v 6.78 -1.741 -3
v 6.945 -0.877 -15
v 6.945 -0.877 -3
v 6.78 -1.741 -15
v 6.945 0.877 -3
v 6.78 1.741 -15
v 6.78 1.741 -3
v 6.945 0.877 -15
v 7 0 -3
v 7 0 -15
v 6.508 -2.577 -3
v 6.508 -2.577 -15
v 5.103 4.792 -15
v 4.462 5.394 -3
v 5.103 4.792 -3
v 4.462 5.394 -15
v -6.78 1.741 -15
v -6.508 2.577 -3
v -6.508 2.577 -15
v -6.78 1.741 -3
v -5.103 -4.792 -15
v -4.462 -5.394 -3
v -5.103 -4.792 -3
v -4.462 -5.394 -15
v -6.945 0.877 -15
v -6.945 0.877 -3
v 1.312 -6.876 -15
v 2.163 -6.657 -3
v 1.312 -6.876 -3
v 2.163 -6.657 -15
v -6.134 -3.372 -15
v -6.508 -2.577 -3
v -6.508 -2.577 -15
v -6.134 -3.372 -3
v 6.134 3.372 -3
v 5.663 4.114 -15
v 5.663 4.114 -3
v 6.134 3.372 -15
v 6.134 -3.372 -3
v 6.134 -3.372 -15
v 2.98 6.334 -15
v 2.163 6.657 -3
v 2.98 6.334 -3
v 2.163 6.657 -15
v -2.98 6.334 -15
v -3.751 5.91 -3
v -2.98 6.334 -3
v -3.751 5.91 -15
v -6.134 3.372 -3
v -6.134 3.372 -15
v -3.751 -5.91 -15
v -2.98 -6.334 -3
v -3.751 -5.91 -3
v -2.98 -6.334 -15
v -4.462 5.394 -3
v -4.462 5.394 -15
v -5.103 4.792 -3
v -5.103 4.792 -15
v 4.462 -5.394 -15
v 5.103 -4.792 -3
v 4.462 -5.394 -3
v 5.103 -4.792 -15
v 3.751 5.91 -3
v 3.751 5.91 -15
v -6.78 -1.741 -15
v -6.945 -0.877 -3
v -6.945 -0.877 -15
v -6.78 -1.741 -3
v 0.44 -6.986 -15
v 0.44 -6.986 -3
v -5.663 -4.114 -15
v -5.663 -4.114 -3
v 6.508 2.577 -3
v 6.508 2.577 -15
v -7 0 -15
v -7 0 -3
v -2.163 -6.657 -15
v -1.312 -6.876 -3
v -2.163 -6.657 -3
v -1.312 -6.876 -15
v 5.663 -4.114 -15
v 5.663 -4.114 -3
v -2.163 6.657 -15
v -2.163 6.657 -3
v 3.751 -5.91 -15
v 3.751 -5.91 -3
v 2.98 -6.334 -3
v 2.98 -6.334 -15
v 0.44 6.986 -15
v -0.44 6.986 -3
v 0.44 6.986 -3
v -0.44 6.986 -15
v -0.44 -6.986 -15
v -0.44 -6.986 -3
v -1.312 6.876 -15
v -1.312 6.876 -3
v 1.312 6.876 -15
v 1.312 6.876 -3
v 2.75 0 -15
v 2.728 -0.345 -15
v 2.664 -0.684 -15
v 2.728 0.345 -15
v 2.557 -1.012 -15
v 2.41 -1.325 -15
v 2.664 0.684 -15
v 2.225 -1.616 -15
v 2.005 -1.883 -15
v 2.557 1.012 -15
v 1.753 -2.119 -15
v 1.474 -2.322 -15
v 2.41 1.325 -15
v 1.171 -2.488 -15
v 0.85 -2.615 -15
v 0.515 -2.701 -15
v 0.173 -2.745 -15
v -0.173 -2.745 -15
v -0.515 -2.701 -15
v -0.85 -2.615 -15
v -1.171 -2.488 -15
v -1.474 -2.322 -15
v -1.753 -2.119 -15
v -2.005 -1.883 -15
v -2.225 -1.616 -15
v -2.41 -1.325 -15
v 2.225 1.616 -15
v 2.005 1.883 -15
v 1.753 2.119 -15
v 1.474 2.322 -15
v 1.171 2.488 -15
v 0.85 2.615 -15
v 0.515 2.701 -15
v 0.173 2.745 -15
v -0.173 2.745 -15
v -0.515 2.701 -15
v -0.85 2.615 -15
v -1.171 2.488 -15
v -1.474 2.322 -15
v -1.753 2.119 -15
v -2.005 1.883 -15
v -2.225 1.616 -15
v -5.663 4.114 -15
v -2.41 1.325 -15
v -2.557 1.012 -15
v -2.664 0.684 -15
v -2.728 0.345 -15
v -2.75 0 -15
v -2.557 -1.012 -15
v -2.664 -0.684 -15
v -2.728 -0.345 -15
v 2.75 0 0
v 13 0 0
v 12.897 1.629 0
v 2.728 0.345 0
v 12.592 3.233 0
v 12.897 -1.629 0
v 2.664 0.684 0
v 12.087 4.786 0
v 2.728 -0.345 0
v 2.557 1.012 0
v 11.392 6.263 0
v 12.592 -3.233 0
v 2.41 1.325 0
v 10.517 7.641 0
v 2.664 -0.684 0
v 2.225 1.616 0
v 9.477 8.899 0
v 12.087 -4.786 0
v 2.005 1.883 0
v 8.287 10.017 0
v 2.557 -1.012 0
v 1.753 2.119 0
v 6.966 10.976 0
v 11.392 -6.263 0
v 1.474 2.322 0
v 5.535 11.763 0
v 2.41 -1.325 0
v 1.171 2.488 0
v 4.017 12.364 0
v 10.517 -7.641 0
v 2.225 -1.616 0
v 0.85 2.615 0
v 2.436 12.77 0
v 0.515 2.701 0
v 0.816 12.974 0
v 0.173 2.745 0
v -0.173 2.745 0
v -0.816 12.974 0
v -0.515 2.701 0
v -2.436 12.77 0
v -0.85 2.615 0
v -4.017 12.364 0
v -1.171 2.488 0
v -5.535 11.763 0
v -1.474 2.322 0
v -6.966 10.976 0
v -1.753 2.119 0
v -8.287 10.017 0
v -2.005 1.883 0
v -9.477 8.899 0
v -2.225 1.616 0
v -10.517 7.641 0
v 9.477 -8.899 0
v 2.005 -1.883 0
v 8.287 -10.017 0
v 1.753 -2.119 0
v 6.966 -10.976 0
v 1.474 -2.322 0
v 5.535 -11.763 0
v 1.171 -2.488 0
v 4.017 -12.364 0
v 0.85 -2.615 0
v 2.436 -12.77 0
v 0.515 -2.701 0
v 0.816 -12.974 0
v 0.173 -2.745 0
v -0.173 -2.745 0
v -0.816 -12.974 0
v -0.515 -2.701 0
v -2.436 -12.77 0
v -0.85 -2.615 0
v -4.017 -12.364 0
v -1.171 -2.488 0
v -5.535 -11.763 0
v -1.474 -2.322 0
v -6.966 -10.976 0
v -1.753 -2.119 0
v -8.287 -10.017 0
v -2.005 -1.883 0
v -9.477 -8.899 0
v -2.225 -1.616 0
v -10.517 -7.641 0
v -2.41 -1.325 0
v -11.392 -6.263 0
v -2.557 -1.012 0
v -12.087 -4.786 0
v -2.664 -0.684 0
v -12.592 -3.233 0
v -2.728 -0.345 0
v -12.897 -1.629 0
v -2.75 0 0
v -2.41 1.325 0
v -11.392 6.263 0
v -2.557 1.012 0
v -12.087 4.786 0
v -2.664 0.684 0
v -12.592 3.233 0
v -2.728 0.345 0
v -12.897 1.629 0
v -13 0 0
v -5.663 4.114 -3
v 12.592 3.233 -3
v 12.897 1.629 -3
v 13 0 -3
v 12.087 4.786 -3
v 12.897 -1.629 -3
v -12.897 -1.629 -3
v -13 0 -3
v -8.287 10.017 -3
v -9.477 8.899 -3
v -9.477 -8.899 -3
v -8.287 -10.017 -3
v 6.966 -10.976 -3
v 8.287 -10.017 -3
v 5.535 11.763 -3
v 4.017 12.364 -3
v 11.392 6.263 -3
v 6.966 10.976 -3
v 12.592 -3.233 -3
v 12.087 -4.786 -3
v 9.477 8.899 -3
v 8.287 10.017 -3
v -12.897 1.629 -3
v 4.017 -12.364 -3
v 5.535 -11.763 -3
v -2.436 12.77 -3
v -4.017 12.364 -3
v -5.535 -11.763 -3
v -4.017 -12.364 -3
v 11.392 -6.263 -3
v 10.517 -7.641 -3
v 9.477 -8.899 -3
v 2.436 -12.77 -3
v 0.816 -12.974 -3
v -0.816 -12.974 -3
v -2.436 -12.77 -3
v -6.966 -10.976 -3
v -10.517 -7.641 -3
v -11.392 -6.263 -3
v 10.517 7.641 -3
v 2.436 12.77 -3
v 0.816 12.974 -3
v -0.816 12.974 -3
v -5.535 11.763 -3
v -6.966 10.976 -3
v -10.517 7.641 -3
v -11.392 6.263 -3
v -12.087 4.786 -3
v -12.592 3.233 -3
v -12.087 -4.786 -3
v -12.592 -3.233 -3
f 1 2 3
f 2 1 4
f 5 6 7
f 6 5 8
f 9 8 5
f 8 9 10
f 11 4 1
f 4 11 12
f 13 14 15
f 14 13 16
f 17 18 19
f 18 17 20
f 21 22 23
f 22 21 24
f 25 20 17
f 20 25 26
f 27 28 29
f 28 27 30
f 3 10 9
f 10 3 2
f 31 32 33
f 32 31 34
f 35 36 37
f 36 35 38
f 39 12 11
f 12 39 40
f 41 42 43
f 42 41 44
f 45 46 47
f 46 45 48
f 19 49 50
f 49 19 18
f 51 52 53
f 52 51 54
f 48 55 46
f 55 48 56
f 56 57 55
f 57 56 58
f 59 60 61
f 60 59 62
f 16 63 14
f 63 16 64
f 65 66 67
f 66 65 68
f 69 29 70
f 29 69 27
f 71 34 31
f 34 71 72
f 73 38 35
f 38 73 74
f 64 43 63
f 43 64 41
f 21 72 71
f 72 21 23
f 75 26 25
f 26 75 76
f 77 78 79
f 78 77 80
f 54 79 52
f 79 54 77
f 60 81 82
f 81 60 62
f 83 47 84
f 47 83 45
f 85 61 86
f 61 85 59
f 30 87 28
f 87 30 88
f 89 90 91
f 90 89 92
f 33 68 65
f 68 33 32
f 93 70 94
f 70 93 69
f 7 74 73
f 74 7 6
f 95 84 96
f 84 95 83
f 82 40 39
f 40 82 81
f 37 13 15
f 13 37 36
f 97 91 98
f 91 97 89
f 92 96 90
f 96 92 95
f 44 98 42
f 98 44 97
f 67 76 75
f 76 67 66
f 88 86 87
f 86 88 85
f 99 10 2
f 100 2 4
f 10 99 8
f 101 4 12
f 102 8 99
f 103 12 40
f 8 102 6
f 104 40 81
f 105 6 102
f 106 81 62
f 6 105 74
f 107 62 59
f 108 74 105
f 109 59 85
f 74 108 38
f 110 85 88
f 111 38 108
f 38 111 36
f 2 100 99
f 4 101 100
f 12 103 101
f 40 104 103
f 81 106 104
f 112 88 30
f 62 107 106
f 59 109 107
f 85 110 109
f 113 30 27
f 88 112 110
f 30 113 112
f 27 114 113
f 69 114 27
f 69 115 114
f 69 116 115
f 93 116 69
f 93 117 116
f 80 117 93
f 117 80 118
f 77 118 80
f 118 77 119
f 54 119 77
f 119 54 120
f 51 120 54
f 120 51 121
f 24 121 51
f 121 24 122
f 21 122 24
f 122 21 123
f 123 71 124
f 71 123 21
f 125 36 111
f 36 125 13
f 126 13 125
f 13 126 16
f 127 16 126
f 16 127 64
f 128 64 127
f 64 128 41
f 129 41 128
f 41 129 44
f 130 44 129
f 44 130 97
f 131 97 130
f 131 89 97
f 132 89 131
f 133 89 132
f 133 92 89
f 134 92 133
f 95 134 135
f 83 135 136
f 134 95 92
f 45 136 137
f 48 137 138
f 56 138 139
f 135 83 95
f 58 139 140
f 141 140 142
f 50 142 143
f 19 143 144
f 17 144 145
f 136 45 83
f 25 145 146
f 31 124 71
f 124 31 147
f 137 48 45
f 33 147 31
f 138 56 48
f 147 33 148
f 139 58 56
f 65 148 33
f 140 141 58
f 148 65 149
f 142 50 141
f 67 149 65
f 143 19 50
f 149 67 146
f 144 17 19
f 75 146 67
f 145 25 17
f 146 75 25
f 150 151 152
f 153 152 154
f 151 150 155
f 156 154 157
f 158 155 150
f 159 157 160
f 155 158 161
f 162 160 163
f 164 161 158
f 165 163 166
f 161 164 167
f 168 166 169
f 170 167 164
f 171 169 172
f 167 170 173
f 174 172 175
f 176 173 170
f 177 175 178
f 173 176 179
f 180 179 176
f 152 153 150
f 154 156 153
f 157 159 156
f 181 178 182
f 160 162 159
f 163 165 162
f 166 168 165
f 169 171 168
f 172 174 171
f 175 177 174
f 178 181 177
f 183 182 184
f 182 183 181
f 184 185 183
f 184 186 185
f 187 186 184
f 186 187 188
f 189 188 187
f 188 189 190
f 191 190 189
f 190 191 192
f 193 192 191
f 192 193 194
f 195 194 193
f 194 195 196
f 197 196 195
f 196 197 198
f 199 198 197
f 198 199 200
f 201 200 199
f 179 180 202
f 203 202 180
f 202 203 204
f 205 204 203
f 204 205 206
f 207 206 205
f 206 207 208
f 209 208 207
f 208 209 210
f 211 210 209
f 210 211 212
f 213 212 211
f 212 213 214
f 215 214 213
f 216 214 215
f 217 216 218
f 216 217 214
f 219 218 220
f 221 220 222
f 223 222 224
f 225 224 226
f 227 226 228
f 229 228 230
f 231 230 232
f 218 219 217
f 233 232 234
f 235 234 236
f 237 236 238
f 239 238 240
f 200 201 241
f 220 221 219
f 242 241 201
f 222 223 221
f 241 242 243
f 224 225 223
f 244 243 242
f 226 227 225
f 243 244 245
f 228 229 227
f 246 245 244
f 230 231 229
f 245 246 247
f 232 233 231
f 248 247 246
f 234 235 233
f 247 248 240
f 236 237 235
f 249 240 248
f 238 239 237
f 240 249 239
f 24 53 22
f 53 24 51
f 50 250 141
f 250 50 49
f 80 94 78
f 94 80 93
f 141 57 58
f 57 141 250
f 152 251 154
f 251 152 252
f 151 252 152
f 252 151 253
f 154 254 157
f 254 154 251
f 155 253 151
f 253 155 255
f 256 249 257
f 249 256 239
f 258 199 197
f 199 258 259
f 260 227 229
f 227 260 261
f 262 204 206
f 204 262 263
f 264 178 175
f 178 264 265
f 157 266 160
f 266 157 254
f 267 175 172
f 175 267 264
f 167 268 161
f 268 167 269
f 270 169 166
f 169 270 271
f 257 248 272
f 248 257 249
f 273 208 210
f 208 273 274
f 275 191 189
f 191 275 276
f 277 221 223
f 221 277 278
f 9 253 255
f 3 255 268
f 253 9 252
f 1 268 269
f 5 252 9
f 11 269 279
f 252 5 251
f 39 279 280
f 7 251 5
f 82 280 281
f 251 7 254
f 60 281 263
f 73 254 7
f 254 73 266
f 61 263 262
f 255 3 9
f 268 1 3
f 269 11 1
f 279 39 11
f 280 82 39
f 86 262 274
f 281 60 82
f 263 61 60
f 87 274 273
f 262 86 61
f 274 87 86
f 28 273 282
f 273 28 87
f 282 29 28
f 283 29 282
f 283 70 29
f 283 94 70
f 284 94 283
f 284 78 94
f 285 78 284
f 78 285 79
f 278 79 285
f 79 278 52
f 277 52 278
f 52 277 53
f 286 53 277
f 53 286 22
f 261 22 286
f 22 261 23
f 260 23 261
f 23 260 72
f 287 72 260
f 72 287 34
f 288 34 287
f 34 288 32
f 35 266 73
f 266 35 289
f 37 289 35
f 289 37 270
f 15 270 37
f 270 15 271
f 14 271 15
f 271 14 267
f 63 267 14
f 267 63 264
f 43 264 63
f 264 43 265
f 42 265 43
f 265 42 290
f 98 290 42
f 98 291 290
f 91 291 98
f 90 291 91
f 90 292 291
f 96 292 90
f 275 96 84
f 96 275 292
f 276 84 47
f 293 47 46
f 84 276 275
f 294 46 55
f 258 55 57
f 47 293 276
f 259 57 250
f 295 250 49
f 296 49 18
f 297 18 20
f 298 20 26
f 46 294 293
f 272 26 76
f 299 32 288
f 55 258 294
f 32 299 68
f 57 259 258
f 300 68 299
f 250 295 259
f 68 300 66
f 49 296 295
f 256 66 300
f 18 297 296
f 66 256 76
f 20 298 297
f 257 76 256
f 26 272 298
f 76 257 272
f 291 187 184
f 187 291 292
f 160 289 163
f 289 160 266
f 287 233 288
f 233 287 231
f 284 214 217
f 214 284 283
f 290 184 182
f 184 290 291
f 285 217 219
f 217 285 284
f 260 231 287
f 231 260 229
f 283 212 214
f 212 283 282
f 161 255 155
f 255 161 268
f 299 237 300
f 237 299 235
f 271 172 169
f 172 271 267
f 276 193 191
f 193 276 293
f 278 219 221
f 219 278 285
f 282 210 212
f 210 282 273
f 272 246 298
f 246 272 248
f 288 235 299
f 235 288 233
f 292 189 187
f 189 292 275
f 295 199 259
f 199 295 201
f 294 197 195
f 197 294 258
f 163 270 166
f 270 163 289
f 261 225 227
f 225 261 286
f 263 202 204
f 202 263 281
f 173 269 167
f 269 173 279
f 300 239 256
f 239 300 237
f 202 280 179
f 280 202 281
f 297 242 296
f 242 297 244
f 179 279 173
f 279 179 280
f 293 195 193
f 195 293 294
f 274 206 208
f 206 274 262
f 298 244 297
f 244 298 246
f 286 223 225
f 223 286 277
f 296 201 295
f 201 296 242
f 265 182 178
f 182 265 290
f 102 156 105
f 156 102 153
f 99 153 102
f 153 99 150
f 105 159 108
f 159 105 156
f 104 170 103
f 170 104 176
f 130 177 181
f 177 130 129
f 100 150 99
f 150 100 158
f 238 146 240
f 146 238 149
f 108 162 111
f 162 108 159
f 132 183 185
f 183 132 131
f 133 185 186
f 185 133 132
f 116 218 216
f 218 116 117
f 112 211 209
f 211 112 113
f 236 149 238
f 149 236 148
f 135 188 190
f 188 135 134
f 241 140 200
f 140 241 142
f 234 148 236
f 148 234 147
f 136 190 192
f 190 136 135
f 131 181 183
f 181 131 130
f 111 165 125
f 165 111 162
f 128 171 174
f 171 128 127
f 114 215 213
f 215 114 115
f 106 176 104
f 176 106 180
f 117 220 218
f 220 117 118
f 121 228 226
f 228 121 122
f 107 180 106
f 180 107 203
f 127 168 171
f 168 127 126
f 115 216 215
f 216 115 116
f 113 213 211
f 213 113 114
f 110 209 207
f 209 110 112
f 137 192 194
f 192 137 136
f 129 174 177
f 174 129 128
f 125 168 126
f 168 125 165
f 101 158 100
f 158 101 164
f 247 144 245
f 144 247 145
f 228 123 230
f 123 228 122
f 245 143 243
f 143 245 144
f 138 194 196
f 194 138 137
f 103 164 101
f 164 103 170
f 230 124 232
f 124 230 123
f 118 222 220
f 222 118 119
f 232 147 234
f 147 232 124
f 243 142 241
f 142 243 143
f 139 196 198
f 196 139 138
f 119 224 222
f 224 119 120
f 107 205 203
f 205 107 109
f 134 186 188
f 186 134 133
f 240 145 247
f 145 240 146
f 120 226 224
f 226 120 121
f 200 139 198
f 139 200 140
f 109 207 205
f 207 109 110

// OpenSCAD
$fn = 50;


difference() {
	union() {
		translate(v = [0, 0, -15.0000000000]) {
			cylinder(h = 15, r = 7.0000000000);
		}
		translate(v = [0, 0, -3.0000000000]) {
			cylinder(h = 3, r = 13.0000000000);
		}
	}
	union() {
		#translate(v = [0, 0, -15]) {
			cylinder(h = 15, r = 2.7500000000);
		}
	}
}
